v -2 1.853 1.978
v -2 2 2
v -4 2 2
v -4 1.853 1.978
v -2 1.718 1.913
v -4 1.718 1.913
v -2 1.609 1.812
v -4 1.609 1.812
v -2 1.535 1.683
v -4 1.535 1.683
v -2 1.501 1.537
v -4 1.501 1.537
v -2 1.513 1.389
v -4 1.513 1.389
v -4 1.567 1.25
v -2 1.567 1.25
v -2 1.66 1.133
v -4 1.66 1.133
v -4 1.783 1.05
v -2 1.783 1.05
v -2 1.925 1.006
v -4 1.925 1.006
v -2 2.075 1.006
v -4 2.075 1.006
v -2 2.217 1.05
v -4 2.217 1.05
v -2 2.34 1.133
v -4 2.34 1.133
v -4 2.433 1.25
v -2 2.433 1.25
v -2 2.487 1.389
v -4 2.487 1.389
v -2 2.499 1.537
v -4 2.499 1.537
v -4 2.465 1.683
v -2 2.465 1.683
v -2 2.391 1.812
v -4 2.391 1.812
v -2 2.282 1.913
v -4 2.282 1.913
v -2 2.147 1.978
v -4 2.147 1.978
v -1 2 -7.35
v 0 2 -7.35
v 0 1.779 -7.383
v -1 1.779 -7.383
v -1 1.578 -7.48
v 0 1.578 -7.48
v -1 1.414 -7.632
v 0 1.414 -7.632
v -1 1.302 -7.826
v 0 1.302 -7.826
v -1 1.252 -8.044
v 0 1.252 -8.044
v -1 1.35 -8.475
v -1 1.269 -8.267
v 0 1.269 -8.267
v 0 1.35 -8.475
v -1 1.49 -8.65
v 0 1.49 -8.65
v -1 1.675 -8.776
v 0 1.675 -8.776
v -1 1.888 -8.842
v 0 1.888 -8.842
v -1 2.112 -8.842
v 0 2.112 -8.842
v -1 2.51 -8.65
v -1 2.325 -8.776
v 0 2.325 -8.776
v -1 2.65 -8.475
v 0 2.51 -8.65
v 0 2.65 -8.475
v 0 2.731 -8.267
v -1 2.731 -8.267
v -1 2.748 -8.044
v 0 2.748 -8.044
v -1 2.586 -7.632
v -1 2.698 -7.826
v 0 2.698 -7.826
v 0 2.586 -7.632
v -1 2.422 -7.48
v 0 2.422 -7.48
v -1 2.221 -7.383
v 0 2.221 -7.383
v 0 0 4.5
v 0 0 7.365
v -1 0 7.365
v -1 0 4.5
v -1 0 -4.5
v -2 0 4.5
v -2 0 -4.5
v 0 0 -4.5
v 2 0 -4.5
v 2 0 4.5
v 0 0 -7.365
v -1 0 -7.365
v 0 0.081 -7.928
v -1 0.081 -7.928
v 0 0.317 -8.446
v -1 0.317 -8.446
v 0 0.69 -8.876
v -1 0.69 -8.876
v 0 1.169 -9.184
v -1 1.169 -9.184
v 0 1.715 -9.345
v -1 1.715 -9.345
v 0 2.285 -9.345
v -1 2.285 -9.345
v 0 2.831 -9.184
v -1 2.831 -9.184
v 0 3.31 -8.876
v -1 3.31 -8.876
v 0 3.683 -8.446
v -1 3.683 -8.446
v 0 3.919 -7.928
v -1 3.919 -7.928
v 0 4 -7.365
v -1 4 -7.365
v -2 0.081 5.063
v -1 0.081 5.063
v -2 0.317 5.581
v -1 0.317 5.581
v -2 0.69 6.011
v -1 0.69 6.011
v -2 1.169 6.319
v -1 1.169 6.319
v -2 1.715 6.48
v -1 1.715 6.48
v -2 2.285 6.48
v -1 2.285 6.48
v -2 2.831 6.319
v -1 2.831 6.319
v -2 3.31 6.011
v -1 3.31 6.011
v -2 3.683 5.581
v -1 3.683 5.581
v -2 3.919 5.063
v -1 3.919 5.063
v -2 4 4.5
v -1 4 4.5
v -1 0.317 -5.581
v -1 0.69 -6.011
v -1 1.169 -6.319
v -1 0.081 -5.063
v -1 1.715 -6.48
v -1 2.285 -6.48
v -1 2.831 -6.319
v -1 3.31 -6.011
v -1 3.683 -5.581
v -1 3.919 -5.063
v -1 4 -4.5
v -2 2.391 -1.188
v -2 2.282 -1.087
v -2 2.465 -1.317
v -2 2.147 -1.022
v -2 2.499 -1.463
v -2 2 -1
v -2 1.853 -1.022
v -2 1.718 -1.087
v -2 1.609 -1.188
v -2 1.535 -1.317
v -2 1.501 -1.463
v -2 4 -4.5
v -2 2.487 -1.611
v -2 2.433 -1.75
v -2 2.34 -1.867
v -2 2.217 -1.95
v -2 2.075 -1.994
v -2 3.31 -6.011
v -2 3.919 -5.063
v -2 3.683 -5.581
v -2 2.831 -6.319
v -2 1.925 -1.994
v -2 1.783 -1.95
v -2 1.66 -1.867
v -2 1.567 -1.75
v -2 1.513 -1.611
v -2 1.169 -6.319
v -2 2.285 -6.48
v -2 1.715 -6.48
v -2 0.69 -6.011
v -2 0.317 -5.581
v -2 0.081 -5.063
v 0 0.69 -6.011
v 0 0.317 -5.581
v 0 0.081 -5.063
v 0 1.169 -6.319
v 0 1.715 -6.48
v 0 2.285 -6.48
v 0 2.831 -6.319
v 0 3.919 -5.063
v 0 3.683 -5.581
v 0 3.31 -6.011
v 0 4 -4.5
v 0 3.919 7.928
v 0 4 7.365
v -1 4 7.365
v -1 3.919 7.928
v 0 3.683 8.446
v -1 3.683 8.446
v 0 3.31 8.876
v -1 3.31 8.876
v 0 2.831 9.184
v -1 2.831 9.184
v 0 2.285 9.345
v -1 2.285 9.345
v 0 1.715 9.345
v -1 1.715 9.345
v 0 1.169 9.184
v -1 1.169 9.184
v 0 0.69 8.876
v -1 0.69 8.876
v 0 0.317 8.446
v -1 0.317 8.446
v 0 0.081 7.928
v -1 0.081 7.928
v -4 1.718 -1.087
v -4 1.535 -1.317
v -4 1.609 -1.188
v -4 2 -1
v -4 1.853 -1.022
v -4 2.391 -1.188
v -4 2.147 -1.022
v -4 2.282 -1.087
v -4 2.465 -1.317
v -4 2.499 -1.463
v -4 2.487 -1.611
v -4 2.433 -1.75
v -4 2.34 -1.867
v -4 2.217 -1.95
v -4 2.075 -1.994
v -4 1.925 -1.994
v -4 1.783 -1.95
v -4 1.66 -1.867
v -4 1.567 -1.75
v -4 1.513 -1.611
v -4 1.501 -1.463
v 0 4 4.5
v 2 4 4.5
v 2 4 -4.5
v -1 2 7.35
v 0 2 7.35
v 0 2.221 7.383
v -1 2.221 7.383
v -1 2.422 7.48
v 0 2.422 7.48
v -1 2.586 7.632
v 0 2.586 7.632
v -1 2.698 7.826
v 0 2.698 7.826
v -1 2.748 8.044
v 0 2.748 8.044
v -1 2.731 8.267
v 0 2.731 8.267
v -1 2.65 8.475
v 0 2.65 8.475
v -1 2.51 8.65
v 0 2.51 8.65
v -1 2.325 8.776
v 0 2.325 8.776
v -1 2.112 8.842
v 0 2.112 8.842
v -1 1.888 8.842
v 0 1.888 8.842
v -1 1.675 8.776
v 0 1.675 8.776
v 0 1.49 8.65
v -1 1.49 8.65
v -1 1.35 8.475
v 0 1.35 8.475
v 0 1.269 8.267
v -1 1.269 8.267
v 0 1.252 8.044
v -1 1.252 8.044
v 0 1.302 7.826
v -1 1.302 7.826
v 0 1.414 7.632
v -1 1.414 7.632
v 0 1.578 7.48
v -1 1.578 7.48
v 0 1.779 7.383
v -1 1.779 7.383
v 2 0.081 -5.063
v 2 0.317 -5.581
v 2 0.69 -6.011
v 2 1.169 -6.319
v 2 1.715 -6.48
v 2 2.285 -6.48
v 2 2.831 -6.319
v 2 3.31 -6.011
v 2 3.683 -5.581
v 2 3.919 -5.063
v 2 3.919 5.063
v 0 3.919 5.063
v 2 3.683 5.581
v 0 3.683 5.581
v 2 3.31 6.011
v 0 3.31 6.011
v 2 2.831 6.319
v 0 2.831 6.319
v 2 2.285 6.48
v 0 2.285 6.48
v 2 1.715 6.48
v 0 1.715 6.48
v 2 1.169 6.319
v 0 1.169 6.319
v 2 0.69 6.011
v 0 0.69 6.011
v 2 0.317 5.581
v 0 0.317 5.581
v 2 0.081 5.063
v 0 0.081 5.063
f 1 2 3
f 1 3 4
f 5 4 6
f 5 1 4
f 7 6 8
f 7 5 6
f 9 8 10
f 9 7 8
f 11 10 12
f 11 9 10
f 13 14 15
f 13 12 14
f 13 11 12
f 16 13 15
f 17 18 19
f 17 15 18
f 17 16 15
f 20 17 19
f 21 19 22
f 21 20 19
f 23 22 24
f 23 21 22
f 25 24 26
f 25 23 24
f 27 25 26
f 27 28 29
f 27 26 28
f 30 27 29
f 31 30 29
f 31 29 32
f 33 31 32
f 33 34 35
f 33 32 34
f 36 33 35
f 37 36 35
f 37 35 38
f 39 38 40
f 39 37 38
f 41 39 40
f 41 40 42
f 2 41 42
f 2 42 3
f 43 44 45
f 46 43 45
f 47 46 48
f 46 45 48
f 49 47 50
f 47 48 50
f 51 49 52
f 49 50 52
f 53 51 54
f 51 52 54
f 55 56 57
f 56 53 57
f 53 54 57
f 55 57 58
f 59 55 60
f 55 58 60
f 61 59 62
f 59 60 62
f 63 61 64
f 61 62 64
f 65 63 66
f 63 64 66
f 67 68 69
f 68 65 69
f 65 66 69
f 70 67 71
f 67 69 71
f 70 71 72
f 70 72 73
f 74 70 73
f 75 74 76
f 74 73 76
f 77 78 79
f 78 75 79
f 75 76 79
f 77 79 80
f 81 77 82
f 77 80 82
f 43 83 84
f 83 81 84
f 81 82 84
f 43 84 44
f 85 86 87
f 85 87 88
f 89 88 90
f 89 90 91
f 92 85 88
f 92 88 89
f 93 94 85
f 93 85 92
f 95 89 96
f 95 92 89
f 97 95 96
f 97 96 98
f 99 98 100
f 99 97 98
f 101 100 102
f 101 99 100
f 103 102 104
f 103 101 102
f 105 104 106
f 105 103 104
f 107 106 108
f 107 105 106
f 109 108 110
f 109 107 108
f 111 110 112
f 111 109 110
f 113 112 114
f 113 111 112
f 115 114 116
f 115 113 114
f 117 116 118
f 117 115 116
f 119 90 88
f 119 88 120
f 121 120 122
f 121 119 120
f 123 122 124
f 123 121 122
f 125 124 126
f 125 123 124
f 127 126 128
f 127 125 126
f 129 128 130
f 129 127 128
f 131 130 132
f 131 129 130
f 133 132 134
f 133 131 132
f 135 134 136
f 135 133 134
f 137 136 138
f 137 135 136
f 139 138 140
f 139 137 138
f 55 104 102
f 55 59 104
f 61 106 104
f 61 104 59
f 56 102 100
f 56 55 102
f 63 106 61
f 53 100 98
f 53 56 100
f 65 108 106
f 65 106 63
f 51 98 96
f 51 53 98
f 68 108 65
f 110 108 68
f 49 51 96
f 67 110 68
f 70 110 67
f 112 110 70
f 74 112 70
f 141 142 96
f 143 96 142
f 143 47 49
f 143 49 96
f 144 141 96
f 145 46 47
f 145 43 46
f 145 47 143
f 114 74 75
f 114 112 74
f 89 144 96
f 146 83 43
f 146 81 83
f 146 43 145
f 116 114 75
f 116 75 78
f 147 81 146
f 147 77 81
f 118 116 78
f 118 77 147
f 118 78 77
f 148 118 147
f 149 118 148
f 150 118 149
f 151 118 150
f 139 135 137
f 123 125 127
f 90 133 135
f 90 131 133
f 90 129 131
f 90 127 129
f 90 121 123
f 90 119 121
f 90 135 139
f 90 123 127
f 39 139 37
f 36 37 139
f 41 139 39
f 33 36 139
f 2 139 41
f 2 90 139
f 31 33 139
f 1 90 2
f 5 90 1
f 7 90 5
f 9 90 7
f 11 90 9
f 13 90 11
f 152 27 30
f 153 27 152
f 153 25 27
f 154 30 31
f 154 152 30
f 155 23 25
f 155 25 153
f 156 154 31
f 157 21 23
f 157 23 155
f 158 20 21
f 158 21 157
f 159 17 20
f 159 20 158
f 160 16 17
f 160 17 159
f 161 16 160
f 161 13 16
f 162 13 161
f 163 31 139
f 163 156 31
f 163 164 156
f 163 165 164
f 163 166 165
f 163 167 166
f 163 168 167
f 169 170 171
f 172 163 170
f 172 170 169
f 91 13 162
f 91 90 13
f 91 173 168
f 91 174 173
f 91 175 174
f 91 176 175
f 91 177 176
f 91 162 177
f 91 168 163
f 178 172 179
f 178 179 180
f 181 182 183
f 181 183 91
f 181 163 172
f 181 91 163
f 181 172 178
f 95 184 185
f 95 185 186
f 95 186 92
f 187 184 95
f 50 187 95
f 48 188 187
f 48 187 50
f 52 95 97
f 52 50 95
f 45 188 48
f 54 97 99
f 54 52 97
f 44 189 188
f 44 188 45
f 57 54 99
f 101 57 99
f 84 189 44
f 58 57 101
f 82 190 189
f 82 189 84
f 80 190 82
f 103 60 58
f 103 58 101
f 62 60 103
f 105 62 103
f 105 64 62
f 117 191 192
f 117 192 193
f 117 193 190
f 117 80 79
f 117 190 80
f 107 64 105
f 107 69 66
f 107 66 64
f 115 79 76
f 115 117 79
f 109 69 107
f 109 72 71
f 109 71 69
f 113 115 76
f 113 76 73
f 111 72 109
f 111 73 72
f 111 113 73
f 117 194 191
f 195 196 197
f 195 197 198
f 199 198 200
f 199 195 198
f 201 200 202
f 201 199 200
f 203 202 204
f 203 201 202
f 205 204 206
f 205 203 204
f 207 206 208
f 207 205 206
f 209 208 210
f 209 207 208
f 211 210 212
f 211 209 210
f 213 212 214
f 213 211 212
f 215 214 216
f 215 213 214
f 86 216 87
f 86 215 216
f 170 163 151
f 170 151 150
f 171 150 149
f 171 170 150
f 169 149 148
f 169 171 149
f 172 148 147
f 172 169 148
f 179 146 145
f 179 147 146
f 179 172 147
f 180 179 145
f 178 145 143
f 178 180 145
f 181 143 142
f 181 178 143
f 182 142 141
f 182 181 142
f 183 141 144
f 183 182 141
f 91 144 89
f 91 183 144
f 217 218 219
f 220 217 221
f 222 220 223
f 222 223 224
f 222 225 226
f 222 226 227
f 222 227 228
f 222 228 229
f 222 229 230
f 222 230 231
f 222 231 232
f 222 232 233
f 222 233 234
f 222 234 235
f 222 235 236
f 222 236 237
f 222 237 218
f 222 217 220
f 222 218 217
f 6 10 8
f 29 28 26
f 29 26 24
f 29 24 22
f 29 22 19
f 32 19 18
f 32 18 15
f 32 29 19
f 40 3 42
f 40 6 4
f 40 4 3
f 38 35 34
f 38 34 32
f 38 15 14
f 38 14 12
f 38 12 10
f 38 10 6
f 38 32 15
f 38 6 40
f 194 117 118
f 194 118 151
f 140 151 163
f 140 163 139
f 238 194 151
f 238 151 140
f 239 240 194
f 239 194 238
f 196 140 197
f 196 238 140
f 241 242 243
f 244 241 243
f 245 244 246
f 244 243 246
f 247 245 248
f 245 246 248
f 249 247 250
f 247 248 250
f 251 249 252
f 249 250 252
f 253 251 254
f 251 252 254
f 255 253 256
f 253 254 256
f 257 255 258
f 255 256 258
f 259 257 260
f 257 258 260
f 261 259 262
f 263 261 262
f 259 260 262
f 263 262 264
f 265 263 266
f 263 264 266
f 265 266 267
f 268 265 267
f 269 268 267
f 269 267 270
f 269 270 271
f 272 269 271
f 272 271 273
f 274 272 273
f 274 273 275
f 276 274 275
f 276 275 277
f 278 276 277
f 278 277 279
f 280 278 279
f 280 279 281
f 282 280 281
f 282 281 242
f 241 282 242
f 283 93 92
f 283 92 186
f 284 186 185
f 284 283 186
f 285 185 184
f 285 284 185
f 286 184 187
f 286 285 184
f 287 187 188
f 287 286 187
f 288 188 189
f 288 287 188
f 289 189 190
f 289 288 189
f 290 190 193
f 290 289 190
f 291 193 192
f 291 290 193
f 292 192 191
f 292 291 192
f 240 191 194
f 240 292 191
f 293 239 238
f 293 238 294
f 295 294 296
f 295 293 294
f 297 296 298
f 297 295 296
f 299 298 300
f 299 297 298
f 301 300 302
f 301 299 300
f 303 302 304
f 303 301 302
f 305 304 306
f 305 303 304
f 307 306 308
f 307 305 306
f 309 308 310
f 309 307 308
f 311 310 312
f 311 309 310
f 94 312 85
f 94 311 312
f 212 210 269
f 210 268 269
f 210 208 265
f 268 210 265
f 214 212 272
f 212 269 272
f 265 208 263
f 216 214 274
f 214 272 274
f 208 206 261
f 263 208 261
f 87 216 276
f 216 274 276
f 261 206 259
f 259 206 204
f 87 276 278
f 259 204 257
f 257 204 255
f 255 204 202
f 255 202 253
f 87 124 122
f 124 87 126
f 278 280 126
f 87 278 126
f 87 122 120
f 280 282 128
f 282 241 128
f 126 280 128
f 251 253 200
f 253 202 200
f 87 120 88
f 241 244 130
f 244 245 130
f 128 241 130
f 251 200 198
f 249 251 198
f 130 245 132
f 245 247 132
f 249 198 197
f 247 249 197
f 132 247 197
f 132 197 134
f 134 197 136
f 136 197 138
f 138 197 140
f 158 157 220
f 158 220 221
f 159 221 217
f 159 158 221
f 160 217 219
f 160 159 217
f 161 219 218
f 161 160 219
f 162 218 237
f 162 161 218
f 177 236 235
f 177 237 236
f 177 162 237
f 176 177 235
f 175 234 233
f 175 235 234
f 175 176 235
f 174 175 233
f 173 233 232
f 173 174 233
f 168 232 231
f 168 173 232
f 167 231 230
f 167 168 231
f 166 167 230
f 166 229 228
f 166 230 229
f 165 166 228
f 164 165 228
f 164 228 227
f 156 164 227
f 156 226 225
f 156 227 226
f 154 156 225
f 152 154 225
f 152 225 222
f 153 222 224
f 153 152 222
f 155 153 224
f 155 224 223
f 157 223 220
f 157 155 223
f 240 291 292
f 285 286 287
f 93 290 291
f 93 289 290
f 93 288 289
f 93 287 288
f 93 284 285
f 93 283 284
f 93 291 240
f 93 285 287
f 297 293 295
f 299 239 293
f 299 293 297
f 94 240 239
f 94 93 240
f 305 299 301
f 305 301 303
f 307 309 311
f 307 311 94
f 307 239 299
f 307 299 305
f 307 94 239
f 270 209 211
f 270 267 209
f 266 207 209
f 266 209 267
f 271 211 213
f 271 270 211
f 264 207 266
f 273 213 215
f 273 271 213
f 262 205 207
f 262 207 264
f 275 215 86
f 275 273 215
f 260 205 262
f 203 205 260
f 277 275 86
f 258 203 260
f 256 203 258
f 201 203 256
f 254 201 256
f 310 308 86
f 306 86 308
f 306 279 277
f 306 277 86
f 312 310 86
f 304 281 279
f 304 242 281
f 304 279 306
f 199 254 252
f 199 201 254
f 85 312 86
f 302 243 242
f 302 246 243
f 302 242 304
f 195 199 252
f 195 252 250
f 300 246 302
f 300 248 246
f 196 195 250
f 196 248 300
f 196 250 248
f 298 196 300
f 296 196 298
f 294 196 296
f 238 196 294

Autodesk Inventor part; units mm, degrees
ref_plane "YZ Plane" through (0, 0, 0) normal (1, 0, 0) x (0, 1, 0)
ref_plane "XZ Plane" through (0, 0, 0) normal (0, 1, 0) x (-1, 0, 0)
ref_plane "XY Plane" through (0, 0, 0) normal (0, 0, 1) x (1, 0, 0)
sketch "Sketch1" plane through (0, 0, 0) normal (0, 1, 0) x (-1, 0, 0)
  line L0 (-2, 6.5) -> (2, 6.5)
  line L1 (2, 6.5) -> (2, -6.5)
  line L2 (2, -6.5) -> (-2, -6.5)
  line L3 (-2, -6.5) -> (-2, 6.5)
  line L4 (-2, 6.5) -> (2, -6.5) construction
  line L5 (2, 6.5) -> (-2, -6.5) construction
  point P0 (0, 0)
  dimension "d0" = 4
  dimension "d1" = 13
extrude "Extrusion1" add sketch "Sketch1" along normal blind 4
sketch "Sketch2" plane through (2, 0, 6.5) normal (1, 0, 0) x (0, 0, -1)
  line L0 (0, 0) -> (0, 4) projected
  line L1 (0, 2) -> (13, 2) construction
  line L2 (13, 0) -> (13, 4) projected
  line L3 (2, 0) -> (11, 0)
  line L4 (11, 4) -> (2, 4)
  arc A0 (2, 4) -> (2, 0) centre (2, 2) ccw
  arc A1 (11, 0) -> (11, 4) centre (11, 2) ccw
  line L5 (0, 4) -> (13, 4) projected
  line L6 (0, 0) -> (13, 0) projected
  point P0 (6.5, 0)
  point P1 (6.5, 2)
extrude "Extrusion2" cut sketch "Sketch2" against normal blind 2 contours L0 A0 L6 | L0 L5 A0 | A1 L2 L6 | L5 L2 A1
sketch "Sketch3" plane through (-2, 0, -6.5) normal (-1, 0, 0) x (0, 0, 1)
  arc A0 (2, 4) -> (0, 2) centre (2, 2) ccw projected
  line L0 (0, 0) -> (0, 4) projected
  line L1 (0, 4) -> (13, 4) projected
  arc A1 (0, 2) -> (2, 0) centre (2, 2) ccw projected
  arc A2 (2, 4) -> (2, 0) centre (2, 2) ccw projected
  line L2 (11, 4) -> (2, 4) projected
  arc A3 (11, 0) -> (11, 4) centre (11, 2) ccw projected
  line L3 (11, 0) -> (2, 0) projected
  line L4 (13, 0) -> (13, 4) projected
  line L5 (0, 0) -> (13, 0) projected
  point P0 (6.5, 0)
  point P1 (13, 2)
extrude "Extrusion3" cut sketch "Sketch3" against normal blind 1 contours A0 L0 L1 | A1 L5 L0 | L1 L4 A3 | L4 L5 A3
sketch "Sketch4" plane through (-2, 0, -4.5) normal (-1, 0, 0) x (0, 0, 1)
  arc A0 (0, 4) -> (-2, 2) centre (0, 2) ccw projected
  circle A1 centre (0, 2) radius 1.5
  arc A2 (11, 2) -> (9, 4) centre (9, 2) ccw projected
  circle A3 centre (9, 2) radius 1.5
  point P0 (4.5, 0)
  dimension "d8" = 3
  dimension "d9" = 3
mark "Mark1"
sketch "Sketch5" plane through (-2, 0, -4.5) normal (-1, 0, 0) x (0, 0, 1)
  circle A0 centre (3, 2) radius 1
  circle A1 centre (0, 2) radius 1.5 projected
  circle A2 centre (9, 2) radius 1.5 projected
  line L0 (0, 4) -> (9, 4) projected
  circle A3 centre (6, 2) radius 1
  point P0 (4.5, 0)
  dimension "d10" = 2
  dimension "d11" = 3
  dimension "d12" = 9
  dimension "d15" = 3
mark "Mark2"
sketch "Sketch6" plane through (-2, 2, -1.5) normal (-1, 0, 0) x (0, 0, 1)
  circle A0 centre (0, 0) radius 1 projected
  circle A1 centre (0, 0) radius 0.5
  circle A2 centre (3, 0) radius 1 projected
  circle A3 centre (3, 0) radius 0.5
  point P0 (1.5, -2)
  dimension "d20" = 1
  dimension "d21" = 1
extrude "Extrusion4" add sketch "Sketch6" along normal blind 2 contours A1 | A3
sketch "Sketch7" plane through (2, 0, 4.5) normal (1, 0, 0) x (0, 0, -1)
  circle A0 centre (0, 2) radius 1.5 projected
  circle A1 centre (9, 2) radius 1.5 projected
  point P0 (4.5, 0)
mark "Mark3"
sketch "Sketch8" plane through (2, 0, 4.5) normal (1, 0, 0) x (0, 0, -1)
  circle A0 centre (6, 2) radius 1 projected
  circle A1 centre (3, 2) radius 1 projected
  circle A2 centre (3, 2) radius 0.75
  circle A3 centre (6, 2) radius 0.75
  point P0 (4.5, 0)
  dimension "d24" = 1.5
  dimension "d25" = 1.5
mark "Mark4"
sketch "Sketch11" plane through (0, 0, 6.5) normal (1, 0, 0) x (0, 0, -1)
  line L0 (-2.865, 2) -> (15.865, 2) construction
  line L1 (-0.865, 0) -> (13.865, 0)
  line L2 (13.865, 4) -> (-0.865, 4)
  arc A0 (-0.865, 4) -> (-0.865, 0) centre (-0.865, 2) ccw
  arc A1 (13.865, 0) -> (13.865, 4) centre (13.865, 2) ccw
  line L3 (2, 0) -> (11, 0) projected
  point P0 (6.5, 0)
  point P1 (6.5, 2)
  point P2 (6.5, 4)
  point P3 (6.5, 0)
  dimension "d31" = 18.73
extrude "Extrusion7" add sketch "Sketch11" against normal blind 1
sketch "Sketch12" plane through (0, 0, 6.5) normal (1, 0, 0) x (0, 0, -1)
  arc A0 (-0.865, 4) -> (-0.865, 0) centre (-0.865, 2) ccw projected
  circle A1 centre (-1.6, 2) radius 0.75
  circle A2 centre (2, 2) radius 1.5 projected
  point P0 (6.5, 0)
  dimension "d34" = 1.5
  dimension "d35" = 3.6
extrude "Extrusion8" cut sketch "Sketch12" against normal blind 1 contours A1
mirror "Mirror1" about plane through (0, 0, 0) normal (0, 0, 1) of "Extrusion8"
equation "\"d9\" = d8"
equation "\"d11\" = 0.333333 * d12"
equation "\"d15\" = d11"
equation "\"d21\" = d20"
equation "\"d25\" = d24"
properties part number "2_pin_ear_female"
